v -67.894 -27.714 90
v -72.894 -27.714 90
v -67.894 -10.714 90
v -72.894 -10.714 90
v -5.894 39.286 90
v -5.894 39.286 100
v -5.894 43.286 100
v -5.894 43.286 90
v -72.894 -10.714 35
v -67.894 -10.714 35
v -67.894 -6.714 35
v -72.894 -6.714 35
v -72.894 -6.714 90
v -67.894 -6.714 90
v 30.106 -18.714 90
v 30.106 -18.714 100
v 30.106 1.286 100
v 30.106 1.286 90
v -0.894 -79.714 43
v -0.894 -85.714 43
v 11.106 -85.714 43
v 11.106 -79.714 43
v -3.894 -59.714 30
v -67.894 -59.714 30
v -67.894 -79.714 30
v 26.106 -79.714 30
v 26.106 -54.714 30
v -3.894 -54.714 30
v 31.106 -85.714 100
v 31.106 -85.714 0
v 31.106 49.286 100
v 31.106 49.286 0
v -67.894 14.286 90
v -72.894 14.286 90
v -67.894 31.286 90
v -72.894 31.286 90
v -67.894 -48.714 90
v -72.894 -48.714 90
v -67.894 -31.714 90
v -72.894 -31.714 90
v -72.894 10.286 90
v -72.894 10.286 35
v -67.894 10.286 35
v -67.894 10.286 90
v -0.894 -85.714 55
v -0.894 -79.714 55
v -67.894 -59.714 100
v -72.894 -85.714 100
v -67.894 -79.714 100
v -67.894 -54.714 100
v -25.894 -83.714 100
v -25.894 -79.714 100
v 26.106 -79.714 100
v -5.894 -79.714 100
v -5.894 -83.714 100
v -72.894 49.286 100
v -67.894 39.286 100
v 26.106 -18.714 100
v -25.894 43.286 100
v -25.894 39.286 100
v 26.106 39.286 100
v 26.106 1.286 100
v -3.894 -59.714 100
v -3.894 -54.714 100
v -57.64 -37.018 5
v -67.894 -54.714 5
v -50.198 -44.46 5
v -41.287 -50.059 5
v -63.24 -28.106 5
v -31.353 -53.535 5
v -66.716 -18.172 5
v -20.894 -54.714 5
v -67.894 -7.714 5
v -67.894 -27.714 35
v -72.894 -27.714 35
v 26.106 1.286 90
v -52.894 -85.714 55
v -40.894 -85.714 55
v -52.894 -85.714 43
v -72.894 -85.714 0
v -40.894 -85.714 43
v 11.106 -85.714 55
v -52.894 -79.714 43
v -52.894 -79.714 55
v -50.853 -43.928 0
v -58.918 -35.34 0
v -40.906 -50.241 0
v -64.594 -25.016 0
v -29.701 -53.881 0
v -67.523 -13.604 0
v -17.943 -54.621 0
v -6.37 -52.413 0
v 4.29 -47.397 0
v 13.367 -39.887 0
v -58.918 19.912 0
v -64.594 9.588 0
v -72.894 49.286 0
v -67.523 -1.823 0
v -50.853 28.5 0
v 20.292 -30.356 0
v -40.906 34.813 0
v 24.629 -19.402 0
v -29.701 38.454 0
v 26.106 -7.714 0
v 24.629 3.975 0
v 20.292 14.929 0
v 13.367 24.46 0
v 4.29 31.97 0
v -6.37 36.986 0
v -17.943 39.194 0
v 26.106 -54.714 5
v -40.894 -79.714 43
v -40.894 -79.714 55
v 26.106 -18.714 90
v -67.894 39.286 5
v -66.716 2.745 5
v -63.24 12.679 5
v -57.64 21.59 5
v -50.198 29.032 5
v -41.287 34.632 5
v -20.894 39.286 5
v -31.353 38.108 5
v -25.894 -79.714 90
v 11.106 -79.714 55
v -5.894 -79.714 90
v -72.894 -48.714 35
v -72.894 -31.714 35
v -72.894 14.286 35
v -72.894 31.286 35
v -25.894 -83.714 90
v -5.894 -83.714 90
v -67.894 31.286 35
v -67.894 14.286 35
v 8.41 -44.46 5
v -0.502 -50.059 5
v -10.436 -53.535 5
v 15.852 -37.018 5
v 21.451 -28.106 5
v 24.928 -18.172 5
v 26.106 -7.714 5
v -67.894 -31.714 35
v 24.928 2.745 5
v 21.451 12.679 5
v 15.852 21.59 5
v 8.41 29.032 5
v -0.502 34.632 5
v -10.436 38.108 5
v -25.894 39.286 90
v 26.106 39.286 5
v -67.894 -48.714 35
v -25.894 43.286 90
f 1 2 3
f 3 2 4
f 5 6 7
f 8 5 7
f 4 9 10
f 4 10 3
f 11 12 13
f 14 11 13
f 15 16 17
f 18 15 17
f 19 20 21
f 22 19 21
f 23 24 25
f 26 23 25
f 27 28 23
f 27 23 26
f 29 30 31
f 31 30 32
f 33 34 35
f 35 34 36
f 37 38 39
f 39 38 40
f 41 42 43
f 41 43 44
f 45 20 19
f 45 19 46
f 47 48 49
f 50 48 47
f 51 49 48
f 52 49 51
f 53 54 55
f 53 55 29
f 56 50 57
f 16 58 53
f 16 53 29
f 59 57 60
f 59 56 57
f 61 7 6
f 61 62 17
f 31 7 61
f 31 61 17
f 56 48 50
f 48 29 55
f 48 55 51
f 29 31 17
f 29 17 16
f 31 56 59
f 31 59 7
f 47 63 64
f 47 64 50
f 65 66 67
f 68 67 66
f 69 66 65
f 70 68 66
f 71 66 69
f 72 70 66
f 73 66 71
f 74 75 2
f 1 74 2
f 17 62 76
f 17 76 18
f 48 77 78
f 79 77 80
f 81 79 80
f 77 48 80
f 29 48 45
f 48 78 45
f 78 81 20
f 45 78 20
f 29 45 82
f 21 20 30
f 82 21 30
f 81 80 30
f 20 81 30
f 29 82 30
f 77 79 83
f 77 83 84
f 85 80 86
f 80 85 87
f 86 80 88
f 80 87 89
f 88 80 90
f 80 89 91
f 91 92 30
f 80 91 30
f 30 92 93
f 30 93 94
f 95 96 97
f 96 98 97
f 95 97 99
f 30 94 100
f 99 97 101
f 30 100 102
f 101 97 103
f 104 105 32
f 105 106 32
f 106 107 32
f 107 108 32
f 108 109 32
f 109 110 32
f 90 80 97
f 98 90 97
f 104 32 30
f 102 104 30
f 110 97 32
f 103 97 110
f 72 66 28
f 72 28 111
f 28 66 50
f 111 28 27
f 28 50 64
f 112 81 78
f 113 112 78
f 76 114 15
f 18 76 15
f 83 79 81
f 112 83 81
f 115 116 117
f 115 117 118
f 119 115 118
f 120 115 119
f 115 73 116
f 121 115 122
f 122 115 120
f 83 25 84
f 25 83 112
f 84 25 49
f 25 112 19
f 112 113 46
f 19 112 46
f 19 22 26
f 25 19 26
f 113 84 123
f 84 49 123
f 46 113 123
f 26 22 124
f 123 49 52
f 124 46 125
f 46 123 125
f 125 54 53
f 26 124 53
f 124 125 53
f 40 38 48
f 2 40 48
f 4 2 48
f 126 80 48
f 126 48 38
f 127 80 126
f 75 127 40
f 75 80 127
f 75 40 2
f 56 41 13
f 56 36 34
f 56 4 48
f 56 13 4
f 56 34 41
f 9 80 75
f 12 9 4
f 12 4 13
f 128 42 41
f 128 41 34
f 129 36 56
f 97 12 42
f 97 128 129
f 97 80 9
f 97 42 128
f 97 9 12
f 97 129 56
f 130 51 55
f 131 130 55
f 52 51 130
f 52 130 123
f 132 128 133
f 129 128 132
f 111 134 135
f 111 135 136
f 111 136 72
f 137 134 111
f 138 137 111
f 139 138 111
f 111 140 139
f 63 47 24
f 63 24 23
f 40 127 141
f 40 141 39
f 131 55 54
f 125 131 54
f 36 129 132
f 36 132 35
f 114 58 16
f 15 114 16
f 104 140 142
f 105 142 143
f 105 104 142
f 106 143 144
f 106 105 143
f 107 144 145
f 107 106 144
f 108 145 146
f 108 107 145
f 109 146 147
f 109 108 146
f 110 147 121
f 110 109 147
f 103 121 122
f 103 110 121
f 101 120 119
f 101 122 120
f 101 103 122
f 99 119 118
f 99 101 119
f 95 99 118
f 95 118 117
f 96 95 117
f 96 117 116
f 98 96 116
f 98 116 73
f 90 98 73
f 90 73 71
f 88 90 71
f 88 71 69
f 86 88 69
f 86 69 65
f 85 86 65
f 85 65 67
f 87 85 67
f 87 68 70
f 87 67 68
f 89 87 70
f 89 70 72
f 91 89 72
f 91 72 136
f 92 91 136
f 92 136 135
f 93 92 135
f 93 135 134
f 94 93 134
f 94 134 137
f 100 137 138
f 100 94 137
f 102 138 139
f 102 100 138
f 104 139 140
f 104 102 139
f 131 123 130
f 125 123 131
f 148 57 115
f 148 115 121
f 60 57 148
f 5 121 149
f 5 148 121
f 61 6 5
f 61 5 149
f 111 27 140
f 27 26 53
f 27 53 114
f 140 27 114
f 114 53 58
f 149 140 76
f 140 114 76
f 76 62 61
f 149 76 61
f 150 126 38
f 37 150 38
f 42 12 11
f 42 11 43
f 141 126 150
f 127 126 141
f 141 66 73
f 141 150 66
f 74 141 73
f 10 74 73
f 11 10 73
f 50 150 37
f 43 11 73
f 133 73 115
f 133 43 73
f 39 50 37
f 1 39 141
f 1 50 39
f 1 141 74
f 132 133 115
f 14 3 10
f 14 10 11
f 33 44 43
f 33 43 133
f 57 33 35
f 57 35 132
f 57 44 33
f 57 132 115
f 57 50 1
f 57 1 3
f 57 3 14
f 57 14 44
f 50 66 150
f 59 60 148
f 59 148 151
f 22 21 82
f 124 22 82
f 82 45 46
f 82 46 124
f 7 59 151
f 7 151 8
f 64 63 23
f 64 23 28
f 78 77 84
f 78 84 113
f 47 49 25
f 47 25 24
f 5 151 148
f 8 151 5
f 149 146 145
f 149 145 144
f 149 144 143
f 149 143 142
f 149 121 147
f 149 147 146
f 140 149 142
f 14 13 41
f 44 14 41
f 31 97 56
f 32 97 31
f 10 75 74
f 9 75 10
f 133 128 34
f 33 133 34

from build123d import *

# Parameters (mm, degrees)
SKETCH_1_W          = 104
SKETCH_1_H          = 135
SKETCH_1_R          = 47
EXTRUDE_2_DEPTH     = 100
SKETCH_2_W          = 94
SKETCH_2_H          = 94
CUT_EXTRUDE_1_DEPTH = 95
SKETCH_3_W          = 30
SKETCH_3_H          = 5
SKETCH_3_W_2        = 94
SKETCH_3_H_2        = 20
CUT_EXTRUDE_3_DEPTH = 70
SKETCH_4_W          = 20
SKETCH_4_H          = 4
SKETCH_4_W_2        = 4
SKETCH_4_H_2        = 20
CUT_EXTRUDE_4_DEPTH = 10
CUT_EXTRUDE_6_REACH = 106
SKETCH_6_W          = 55
SKETCH_6_H          = 17
CUT_EXTRUDE_7_REACH = 137
SKETCH_7_W          = 12
SKETCH_7_H          = 12


with BuildPart() as part:
    # 草圖1 → 填料-伸長2 (new body)
    with BuildSketch(Plane.XY):
        with Locations((-20.894077044, -18.213740458)):
            Rectangle(SKETCH_1_W, SKETCH_1_H)
        with Locations((-20.894077044, -7.713740458)):
            Circle(SKETCH_1_R, mode=Mode.SUBTRACT)
    extrude(amount=EXTRUDE_2_DEPTH)

    # 草圖2 → 除料-伸長1 (cut)
    with BuildSketch(Plane.XY.offset(100)):
        with Locations((-20.894077044, -7.713740458)):
            Rectangle(SKETCH_2_W, SKETCH_2_H)
    extrude(amount=-CUT_EXTRUDE_1_DEPTH, mode=Mode.SUBTRACT)

    # 草圖3 → 除料-伸長3 (cut)
    with BuildSketch(Plane.XY.offset(100)):
        with Locations((11.105922956, -57.213740458)):
            Rectangle(SKETCH_3_W, SKETCH_3_H)
        with Locations((-20.894077044, -69.713740458)):
            Rectangle(SKETCH_3_W_2, SKETCH_3_H_2)
    extrude(amount=-CUT_EXTRUDE_3_DEPTH, mode=Mode.SUBTRACT)

    # 草圖4 → 除料-伸長4 (cut)
    with BuildSketch(Plane.XY.offset(100)):
        with Locations((-15.894077044, -81.713740458)):
            Rectangle(SKETCH_4_W, SKETCH_4_H)
        with Locations((28.105922956, -8.713740458)):
            Rectangle(SKETCH_4_W_2, SKETCH_4_H_2)
        with Locations((-15.894077044, 41.286259542)):
            Rectangle(SKETCH_4_W, SKETCH_4_H)
    extrude(amount=-CUT_EXTRUDE_4_DEPTH, mode=Mode.SUBTRACT)

    # 草圖6 → 除料-伸長6 (cut, up to next)
    with BuildSketch(Plane.ZY.offset(72.894077044), mode=Mode.PRIVATE) as cut_extrude_6_sk1:
        with Locations((62.5, 22.786259542)):
            Rectangle(SKETCH_6_W, SKETCH_6_H)
    cut_extrude_6_tool1 = extrude(cut_extrude_6_sk1.sketch, amount=-CUT_EXTRUDE_6_REACH, mode=Mode.PRIVATE) & part.part
    add(cut_extrude_6_tool1.solids().sort_by_distance((-72.894077, 22.78626, 62.5))[0], mode=Mode.SUBTRACT)
    # 草圖6 → 除料-伸長6 (cut, up to next)
    with BuildSketch(Plane.ZY.offset(72.894077044), mode=Mode.PRIVATE) as cut_extrude_6_sk2:
        with Locations((62.5, 1.786259542)):
            Rectangle(SKETCH_6_W, SKETCH_6_H)
    cut_extrude_6_tool2 = extrude(cut_extrude_6_sk2.sketch, amount=-CUT_EXTRUDE_6_REACH, mode=Mode.PRIVATE) & part.part
    add(cut_extrude_6_tool2.solids().sort_by_distance((-72.894077, 1.78626, 62.5))[0], mode=Mode.SUBTRACT)
    # 草圖6 → 除料-伸長6 (cut, up to next)
    with BuildSketch(Plane.ZY.offset(72.894077044), mode=Mode.PRIVATE) as cut_extrude_6_sk3:
        with Locations((62.5, -19.213740458)):
            Rectangle(SKETCH_6_W, SKETCH_6_H)
    cut_extrude_6_tool3 = extrude(cut_extrude_6_sk3.sketch, amount=-CUT_EXTRUDE_6_REACH, mode=Mode.PRIVATE) & part.part
    add(cut_extrude_6_tool3.solids().sort_by_distance((-72.894077, -19.21374, 62.5))[0], mode=Mode.SUBTRACT)
    # 草圖6 → 除料-伸長6 (cut, up to next)
    with BuildSketch(Plane.ZY.offset(72.894077044), mode=Mode.PRIVATE) as cut_extrude_6_sk4:
        with Locations((62.5, -40.213740458)):
            Rectangle(SKETCH_6_W, SKETCH_6_H)
    cut_extrude_6_tool4 = extrude(cut_extrude_6_sk4.sketch, amount=-CUT_EXTRUDE_6_REACH, mode=Mode.PRIVATE) & part.part
    add(cut_extrude_6_tool4.solids().sort_by_distance((-72.894077, -40.21374, 62.5))[0], mode=Mode.SUBTRACT)

    # 草圖7 → 除料-伸長7 (cut, up to next)
    with BuildSketch(Plane.XZ.offset(85.713740458), mode=Mode.PRIVATE) as cut_extrude_7_sk1:
        with Locations((5.105922956, 49)):
            Rectangle(SKETCH_7_W, SKETCH_7_H)
    cut_extrude_7_tool1 = extrude(cut_extrude_7_sk1.sketch, amount=-CUT_EXTRUDE_7_REACH, mode=Mode.PRIVATE) & part.part
    add(cut_extrude_7_tool1.solids().sort_by_distance((5.105923, -85.71374, 49))[0], mode=Mode.SUBTRACT)
    # 草圖7 → 除料-伸長7 (cut, up to next)
    with BuildSketch(Plane.XZ.offset(85.713740458), mode=Mode.PRIVATE) as cut_extrude_7_sk2:
        with Locations((-46.894077044, 49)):
            Rectangle(SKETCH_7_W, SKETCH_7_H)
    cut_extrude_7_tool2 = extrude(cut_extrude_7_sk2.sketch, amount=-CUT_EXTRUDE_7_REACH, mode=Mode.PRIVATE) & part.part
    add(cut_extrude_7_tool2.solids().sort_by_distance((-46.894077, -85.71374, 49))[0], mode=Mode.SUBTRACT)


solid = part.part
